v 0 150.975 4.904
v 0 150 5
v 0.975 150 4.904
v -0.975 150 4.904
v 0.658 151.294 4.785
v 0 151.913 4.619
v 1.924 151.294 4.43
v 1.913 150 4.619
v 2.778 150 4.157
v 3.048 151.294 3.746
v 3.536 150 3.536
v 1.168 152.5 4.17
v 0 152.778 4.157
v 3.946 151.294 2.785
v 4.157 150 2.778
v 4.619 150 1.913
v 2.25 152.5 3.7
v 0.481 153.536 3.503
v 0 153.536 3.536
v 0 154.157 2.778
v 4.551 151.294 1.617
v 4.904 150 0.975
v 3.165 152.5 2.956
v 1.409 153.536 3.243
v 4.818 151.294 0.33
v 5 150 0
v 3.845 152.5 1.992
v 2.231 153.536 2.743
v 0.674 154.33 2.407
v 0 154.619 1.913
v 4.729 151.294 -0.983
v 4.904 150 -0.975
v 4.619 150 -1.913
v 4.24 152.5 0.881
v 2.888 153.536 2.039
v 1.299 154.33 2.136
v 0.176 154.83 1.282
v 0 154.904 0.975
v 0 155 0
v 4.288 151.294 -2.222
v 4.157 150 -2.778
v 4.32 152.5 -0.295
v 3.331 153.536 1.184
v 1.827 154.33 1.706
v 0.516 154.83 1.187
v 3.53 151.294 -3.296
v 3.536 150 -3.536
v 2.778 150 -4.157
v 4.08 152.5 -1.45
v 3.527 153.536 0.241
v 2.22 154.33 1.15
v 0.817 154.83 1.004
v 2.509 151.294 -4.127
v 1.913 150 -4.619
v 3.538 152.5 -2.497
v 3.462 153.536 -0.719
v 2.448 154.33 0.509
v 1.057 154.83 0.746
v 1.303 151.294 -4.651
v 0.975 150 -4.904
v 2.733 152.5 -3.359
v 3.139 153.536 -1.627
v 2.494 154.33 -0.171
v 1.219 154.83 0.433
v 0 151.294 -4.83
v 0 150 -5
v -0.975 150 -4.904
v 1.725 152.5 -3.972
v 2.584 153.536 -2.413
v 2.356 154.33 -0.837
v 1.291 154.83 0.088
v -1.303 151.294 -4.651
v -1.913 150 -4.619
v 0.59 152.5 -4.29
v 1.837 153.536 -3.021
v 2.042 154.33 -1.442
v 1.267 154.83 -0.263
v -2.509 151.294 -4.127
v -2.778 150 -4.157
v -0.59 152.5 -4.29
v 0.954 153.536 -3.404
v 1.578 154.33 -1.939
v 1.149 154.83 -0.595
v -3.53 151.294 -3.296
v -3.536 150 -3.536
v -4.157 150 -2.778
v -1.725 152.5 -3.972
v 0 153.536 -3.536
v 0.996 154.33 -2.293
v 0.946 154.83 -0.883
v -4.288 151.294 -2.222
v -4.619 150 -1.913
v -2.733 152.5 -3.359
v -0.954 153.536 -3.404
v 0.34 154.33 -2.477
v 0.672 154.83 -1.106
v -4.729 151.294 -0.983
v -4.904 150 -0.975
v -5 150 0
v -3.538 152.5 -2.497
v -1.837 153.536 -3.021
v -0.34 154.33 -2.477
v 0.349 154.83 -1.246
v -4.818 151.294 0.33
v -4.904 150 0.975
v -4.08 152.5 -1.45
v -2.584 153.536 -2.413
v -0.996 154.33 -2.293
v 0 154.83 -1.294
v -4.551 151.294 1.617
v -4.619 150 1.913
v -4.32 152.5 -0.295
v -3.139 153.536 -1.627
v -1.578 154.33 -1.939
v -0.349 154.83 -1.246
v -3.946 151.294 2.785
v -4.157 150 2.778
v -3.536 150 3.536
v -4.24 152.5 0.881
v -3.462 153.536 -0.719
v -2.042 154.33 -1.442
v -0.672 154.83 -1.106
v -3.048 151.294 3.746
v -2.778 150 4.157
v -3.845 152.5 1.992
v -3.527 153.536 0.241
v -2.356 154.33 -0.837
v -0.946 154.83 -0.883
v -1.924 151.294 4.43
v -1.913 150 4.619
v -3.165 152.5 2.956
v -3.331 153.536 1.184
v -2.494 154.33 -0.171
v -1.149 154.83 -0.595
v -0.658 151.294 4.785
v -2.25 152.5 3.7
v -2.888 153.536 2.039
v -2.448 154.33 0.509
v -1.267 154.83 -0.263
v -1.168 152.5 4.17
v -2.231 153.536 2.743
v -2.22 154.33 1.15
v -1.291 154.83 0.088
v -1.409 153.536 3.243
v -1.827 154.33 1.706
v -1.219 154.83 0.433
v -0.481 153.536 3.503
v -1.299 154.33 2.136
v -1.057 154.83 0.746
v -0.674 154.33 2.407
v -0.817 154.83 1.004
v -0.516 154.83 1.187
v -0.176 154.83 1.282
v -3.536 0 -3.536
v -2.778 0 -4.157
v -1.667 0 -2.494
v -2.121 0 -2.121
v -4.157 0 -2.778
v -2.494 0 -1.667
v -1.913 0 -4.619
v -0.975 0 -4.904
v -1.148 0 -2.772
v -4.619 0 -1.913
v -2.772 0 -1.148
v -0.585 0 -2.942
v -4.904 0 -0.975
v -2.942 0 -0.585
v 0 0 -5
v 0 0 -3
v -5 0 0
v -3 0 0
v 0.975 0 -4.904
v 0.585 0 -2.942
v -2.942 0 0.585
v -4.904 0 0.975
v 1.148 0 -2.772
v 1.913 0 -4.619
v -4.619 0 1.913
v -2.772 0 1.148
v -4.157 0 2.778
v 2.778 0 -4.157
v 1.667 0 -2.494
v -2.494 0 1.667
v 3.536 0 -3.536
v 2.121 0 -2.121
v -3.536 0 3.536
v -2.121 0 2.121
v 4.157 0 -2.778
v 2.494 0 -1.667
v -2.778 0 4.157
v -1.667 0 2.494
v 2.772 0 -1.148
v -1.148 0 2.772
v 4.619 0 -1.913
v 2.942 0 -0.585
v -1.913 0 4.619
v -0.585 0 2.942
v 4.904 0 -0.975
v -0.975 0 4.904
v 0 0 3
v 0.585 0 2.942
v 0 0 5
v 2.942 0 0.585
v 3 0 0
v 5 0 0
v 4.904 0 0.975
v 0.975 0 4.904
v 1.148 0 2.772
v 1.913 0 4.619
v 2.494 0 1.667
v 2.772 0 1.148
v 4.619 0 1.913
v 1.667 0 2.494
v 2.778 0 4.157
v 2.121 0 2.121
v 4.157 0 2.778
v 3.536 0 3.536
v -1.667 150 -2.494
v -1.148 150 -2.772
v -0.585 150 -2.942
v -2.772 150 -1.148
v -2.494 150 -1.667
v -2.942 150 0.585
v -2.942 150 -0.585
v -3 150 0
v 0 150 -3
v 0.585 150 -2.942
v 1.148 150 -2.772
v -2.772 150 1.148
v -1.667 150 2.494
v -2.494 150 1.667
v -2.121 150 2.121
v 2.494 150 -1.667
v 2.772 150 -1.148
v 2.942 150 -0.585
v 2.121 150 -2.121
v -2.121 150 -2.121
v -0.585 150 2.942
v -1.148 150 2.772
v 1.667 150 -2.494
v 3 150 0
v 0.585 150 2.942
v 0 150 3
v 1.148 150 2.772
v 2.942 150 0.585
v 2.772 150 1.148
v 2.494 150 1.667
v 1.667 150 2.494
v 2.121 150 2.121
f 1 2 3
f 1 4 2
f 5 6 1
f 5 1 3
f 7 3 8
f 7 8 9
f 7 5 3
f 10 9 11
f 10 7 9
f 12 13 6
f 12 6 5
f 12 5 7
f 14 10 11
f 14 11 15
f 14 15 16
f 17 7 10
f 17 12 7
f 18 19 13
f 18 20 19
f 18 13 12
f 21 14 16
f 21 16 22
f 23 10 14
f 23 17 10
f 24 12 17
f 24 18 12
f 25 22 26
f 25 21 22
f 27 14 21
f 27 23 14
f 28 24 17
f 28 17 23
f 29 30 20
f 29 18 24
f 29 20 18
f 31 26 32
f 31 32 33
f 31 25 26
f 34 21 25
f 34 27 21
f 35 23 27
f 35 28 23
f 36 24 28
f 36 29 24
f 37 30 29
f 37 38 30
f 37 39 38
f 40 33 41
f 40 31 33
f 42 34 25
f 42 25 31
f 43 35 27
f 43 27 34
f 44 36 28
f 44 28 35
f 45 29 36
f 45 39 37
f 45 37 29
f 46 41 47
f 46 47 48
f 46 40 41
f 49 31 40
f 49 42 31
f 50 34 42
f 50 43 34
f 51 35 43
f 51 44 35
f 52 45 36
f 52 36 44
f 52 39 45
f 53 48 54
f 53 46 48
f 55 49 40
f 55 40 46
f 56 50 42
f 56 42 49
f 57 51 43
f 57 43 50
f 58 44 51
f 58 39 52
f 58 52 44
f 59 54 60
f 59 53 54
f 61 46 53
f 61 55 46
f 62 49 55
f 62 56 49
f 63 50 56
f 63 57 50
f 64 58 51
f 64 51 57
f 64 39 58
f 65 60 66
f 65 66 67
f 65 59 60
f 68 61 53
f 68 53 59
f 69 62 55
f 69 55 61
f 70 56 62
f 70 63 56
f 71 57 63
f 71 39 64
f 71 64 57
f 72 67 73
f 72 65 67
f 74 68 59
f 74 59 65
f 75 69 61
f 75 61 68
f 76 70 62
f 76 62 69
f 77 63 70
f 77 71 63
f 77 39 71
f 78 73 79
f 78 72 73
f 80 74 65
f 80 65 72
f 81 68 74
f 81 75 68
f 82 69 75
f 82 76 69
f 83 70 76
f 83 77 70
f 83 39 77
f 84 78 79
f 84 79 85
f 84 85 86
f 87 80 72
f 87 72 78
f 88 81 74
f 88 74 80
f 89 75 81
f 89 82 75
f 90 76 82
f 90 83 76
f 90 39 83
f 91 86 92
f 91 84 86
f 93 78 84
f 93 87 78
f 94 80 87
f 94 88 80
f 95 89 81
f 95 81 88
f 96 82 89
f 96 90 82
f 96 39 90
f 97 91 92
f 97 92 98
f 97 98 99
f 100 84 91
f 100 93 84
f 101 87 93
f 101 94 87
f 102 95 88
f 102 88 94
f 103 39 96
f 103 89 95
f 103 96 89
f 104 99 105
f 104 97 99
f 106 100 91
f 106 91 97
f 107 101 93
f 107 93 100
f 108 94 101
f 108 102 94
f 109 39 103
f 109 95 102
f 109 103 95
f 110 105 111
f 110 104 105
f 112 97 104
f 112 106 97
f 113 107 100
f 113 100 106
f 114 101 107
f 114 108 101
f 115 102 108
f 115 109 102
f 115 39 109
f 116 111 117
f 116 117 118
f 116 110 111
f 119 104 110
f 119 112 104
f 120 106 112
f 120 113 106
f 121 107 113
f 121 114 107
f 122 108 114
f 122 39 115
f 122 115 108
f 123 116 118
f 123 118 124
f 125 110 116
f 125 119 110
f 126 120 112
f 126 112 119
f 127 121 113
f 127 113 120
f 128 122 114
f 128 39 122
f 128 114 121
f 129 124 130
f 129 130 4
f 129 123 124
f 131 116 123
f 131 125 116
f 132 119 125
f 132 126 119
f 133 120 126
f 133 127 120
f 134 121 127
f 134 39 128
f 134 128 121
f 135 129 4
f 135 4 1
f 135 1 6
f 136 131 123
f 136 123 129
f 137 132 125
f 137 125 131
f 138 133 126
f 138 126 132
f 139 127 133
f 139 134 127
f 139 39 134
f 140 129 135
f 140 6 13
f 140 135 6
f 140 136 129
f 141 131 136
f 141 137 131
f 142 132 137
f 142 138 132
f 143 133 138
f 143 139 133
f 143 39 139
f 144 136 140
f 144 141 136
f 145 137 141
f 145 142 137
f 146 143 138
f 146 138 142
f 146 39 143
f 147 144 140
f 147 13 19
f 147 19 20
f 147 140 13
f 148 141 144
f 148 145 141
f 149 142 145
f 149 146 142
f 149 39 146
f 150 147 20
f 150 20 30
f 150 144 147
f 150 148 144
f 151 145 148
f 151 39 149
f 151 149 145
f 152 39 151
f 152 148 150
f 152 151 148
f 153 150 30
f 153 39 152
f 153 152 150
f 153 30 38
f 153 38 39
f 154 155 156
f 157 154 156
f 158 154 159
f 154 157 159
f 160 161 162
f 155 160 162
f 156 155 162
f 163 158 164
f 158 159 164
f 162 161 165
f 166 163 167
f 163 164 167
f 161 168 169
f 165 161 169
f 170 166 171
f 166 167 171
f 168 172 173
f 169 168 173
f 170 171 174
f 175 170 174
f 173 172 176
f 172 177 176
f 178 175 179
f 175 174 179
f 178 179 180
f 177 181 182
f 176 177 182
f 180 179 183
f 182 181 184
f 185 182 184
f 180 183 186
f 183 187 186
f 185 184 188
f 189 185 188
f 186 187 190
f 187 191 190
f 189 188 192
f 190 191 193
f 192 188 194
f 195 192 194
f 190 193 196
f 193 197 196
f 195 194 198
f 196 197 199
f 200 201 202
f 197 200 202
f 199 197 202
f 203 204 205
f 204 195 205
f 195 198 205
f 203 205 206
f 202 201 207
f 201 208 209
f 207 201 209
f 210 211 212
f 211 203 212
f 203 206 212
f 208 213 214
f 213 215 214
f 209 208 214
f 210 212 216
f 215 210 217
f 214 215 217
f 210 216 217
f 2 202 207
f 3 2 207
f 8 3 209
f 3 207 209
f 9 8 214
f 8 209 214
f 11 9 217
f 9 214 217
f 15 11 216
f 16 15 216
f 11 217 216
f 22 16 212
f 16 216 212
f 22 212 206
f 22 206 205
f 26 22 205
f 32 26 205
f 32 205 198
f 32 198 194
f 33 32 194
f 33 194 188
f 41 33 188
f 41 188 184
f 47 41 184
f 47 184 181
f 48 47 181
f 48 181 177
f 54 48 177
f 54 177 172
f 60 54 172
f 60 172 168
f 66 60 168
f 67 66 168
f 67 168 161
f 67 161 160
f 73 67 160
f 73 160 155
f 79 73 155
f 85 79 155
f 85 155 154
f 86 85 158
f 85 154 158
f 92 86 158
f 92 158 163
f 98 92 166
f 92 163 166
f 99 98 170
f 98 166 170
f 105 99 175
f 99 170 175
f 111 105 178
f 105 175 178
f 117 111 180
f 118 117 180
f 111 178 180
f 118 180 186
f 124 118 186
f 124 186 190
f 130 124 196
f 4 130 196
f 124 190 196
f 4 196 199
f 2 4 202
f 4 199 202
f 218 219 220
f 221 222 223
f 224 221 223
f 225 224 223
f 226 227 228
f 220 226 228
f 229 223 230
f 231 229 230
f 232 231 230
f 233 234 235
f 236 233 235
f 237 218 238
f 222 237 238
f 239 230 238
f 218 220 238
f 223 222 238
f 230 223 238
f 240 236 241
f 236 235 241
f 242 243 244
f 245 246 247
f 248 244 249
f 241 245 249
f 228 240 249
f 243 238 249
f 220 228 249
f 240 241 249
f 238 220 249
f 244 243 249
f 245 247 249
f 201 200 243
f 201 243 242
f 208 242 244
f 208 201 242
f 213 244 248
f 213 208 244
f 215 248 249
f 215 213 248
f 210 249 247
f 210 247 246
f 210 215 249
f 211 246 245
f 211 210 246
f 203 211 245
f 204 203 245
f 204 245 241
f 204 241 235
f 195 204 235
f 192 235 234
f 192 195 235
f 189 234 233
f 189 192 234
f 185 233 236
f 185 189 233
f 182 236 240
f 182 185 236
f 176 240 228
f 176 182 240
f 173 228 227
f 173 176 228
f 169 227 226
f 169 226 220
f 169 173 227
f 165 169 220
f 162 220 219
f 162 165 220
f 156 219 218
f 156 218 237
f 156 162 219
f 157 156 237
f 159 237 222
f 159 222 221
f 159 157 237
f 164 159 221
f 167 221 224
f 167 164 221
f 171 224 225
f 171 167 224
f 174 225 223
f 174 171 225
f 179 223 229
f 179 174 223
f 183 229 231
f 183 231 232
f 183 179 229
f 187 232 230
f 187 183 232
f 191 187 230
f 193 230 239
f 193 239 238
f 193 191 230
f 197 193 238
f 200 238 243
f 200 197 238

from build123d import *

# Parameters (mm, degrees)
IZIM1_R                     = 5
IZIM1_R_2                   = 3
Y_KSEKLIK_EKSTR_ZYON1_DEPTH = 150
IZIM2_R                     = 5
Y_KSEKLIK_EKSTR_ZYON2_DEPTH = 5
RADYUS1_R                   = 5


with BuildPart() as part:
    # Çizim1 → Yükseklik-Ekstrüzyon1 (new body)
    with BuildSketch(Plane(origin=(0, 0, 0), x_dir=(1, 0, 0), z_dir=(0, 1, 0))):
        with Locations(Location((0, 0, 0), (0, 0, 270))):
            Circle(IZIM1_R)
        with Locations(Location((0, 0, 0), (0, 0, 270))):
            Circle(IZIM1_R_2, mode=Mode.SUBTRACT)
    extrude(amount=Y_KSEKLIK_EKSTR_ZYON1_DEPTH)

    # Çizim2 → Yükseklik-Ekstrüzyon2 (add)
    with BuildSketch(Plane(origin=(0, 150, 0), x_dir=(1, 0, 0), z_dir=(0, 1, 0))):
        with Locations(Location((0, 0, 0), (0, 0, 270))):
            Circle(IZIM2_R)
    extrude(amount=Y_KSEKLIK_EKSTR_ZYON2_DEPTH)

    # Radyus1
    radyus1_edges = [part.edges().sort_by_distance(p)[0] for p in [
        (0, 155, -5),
    ]]
    fillet(radyus1_edges, radius=RADYUS1_R)


solid = part.part
